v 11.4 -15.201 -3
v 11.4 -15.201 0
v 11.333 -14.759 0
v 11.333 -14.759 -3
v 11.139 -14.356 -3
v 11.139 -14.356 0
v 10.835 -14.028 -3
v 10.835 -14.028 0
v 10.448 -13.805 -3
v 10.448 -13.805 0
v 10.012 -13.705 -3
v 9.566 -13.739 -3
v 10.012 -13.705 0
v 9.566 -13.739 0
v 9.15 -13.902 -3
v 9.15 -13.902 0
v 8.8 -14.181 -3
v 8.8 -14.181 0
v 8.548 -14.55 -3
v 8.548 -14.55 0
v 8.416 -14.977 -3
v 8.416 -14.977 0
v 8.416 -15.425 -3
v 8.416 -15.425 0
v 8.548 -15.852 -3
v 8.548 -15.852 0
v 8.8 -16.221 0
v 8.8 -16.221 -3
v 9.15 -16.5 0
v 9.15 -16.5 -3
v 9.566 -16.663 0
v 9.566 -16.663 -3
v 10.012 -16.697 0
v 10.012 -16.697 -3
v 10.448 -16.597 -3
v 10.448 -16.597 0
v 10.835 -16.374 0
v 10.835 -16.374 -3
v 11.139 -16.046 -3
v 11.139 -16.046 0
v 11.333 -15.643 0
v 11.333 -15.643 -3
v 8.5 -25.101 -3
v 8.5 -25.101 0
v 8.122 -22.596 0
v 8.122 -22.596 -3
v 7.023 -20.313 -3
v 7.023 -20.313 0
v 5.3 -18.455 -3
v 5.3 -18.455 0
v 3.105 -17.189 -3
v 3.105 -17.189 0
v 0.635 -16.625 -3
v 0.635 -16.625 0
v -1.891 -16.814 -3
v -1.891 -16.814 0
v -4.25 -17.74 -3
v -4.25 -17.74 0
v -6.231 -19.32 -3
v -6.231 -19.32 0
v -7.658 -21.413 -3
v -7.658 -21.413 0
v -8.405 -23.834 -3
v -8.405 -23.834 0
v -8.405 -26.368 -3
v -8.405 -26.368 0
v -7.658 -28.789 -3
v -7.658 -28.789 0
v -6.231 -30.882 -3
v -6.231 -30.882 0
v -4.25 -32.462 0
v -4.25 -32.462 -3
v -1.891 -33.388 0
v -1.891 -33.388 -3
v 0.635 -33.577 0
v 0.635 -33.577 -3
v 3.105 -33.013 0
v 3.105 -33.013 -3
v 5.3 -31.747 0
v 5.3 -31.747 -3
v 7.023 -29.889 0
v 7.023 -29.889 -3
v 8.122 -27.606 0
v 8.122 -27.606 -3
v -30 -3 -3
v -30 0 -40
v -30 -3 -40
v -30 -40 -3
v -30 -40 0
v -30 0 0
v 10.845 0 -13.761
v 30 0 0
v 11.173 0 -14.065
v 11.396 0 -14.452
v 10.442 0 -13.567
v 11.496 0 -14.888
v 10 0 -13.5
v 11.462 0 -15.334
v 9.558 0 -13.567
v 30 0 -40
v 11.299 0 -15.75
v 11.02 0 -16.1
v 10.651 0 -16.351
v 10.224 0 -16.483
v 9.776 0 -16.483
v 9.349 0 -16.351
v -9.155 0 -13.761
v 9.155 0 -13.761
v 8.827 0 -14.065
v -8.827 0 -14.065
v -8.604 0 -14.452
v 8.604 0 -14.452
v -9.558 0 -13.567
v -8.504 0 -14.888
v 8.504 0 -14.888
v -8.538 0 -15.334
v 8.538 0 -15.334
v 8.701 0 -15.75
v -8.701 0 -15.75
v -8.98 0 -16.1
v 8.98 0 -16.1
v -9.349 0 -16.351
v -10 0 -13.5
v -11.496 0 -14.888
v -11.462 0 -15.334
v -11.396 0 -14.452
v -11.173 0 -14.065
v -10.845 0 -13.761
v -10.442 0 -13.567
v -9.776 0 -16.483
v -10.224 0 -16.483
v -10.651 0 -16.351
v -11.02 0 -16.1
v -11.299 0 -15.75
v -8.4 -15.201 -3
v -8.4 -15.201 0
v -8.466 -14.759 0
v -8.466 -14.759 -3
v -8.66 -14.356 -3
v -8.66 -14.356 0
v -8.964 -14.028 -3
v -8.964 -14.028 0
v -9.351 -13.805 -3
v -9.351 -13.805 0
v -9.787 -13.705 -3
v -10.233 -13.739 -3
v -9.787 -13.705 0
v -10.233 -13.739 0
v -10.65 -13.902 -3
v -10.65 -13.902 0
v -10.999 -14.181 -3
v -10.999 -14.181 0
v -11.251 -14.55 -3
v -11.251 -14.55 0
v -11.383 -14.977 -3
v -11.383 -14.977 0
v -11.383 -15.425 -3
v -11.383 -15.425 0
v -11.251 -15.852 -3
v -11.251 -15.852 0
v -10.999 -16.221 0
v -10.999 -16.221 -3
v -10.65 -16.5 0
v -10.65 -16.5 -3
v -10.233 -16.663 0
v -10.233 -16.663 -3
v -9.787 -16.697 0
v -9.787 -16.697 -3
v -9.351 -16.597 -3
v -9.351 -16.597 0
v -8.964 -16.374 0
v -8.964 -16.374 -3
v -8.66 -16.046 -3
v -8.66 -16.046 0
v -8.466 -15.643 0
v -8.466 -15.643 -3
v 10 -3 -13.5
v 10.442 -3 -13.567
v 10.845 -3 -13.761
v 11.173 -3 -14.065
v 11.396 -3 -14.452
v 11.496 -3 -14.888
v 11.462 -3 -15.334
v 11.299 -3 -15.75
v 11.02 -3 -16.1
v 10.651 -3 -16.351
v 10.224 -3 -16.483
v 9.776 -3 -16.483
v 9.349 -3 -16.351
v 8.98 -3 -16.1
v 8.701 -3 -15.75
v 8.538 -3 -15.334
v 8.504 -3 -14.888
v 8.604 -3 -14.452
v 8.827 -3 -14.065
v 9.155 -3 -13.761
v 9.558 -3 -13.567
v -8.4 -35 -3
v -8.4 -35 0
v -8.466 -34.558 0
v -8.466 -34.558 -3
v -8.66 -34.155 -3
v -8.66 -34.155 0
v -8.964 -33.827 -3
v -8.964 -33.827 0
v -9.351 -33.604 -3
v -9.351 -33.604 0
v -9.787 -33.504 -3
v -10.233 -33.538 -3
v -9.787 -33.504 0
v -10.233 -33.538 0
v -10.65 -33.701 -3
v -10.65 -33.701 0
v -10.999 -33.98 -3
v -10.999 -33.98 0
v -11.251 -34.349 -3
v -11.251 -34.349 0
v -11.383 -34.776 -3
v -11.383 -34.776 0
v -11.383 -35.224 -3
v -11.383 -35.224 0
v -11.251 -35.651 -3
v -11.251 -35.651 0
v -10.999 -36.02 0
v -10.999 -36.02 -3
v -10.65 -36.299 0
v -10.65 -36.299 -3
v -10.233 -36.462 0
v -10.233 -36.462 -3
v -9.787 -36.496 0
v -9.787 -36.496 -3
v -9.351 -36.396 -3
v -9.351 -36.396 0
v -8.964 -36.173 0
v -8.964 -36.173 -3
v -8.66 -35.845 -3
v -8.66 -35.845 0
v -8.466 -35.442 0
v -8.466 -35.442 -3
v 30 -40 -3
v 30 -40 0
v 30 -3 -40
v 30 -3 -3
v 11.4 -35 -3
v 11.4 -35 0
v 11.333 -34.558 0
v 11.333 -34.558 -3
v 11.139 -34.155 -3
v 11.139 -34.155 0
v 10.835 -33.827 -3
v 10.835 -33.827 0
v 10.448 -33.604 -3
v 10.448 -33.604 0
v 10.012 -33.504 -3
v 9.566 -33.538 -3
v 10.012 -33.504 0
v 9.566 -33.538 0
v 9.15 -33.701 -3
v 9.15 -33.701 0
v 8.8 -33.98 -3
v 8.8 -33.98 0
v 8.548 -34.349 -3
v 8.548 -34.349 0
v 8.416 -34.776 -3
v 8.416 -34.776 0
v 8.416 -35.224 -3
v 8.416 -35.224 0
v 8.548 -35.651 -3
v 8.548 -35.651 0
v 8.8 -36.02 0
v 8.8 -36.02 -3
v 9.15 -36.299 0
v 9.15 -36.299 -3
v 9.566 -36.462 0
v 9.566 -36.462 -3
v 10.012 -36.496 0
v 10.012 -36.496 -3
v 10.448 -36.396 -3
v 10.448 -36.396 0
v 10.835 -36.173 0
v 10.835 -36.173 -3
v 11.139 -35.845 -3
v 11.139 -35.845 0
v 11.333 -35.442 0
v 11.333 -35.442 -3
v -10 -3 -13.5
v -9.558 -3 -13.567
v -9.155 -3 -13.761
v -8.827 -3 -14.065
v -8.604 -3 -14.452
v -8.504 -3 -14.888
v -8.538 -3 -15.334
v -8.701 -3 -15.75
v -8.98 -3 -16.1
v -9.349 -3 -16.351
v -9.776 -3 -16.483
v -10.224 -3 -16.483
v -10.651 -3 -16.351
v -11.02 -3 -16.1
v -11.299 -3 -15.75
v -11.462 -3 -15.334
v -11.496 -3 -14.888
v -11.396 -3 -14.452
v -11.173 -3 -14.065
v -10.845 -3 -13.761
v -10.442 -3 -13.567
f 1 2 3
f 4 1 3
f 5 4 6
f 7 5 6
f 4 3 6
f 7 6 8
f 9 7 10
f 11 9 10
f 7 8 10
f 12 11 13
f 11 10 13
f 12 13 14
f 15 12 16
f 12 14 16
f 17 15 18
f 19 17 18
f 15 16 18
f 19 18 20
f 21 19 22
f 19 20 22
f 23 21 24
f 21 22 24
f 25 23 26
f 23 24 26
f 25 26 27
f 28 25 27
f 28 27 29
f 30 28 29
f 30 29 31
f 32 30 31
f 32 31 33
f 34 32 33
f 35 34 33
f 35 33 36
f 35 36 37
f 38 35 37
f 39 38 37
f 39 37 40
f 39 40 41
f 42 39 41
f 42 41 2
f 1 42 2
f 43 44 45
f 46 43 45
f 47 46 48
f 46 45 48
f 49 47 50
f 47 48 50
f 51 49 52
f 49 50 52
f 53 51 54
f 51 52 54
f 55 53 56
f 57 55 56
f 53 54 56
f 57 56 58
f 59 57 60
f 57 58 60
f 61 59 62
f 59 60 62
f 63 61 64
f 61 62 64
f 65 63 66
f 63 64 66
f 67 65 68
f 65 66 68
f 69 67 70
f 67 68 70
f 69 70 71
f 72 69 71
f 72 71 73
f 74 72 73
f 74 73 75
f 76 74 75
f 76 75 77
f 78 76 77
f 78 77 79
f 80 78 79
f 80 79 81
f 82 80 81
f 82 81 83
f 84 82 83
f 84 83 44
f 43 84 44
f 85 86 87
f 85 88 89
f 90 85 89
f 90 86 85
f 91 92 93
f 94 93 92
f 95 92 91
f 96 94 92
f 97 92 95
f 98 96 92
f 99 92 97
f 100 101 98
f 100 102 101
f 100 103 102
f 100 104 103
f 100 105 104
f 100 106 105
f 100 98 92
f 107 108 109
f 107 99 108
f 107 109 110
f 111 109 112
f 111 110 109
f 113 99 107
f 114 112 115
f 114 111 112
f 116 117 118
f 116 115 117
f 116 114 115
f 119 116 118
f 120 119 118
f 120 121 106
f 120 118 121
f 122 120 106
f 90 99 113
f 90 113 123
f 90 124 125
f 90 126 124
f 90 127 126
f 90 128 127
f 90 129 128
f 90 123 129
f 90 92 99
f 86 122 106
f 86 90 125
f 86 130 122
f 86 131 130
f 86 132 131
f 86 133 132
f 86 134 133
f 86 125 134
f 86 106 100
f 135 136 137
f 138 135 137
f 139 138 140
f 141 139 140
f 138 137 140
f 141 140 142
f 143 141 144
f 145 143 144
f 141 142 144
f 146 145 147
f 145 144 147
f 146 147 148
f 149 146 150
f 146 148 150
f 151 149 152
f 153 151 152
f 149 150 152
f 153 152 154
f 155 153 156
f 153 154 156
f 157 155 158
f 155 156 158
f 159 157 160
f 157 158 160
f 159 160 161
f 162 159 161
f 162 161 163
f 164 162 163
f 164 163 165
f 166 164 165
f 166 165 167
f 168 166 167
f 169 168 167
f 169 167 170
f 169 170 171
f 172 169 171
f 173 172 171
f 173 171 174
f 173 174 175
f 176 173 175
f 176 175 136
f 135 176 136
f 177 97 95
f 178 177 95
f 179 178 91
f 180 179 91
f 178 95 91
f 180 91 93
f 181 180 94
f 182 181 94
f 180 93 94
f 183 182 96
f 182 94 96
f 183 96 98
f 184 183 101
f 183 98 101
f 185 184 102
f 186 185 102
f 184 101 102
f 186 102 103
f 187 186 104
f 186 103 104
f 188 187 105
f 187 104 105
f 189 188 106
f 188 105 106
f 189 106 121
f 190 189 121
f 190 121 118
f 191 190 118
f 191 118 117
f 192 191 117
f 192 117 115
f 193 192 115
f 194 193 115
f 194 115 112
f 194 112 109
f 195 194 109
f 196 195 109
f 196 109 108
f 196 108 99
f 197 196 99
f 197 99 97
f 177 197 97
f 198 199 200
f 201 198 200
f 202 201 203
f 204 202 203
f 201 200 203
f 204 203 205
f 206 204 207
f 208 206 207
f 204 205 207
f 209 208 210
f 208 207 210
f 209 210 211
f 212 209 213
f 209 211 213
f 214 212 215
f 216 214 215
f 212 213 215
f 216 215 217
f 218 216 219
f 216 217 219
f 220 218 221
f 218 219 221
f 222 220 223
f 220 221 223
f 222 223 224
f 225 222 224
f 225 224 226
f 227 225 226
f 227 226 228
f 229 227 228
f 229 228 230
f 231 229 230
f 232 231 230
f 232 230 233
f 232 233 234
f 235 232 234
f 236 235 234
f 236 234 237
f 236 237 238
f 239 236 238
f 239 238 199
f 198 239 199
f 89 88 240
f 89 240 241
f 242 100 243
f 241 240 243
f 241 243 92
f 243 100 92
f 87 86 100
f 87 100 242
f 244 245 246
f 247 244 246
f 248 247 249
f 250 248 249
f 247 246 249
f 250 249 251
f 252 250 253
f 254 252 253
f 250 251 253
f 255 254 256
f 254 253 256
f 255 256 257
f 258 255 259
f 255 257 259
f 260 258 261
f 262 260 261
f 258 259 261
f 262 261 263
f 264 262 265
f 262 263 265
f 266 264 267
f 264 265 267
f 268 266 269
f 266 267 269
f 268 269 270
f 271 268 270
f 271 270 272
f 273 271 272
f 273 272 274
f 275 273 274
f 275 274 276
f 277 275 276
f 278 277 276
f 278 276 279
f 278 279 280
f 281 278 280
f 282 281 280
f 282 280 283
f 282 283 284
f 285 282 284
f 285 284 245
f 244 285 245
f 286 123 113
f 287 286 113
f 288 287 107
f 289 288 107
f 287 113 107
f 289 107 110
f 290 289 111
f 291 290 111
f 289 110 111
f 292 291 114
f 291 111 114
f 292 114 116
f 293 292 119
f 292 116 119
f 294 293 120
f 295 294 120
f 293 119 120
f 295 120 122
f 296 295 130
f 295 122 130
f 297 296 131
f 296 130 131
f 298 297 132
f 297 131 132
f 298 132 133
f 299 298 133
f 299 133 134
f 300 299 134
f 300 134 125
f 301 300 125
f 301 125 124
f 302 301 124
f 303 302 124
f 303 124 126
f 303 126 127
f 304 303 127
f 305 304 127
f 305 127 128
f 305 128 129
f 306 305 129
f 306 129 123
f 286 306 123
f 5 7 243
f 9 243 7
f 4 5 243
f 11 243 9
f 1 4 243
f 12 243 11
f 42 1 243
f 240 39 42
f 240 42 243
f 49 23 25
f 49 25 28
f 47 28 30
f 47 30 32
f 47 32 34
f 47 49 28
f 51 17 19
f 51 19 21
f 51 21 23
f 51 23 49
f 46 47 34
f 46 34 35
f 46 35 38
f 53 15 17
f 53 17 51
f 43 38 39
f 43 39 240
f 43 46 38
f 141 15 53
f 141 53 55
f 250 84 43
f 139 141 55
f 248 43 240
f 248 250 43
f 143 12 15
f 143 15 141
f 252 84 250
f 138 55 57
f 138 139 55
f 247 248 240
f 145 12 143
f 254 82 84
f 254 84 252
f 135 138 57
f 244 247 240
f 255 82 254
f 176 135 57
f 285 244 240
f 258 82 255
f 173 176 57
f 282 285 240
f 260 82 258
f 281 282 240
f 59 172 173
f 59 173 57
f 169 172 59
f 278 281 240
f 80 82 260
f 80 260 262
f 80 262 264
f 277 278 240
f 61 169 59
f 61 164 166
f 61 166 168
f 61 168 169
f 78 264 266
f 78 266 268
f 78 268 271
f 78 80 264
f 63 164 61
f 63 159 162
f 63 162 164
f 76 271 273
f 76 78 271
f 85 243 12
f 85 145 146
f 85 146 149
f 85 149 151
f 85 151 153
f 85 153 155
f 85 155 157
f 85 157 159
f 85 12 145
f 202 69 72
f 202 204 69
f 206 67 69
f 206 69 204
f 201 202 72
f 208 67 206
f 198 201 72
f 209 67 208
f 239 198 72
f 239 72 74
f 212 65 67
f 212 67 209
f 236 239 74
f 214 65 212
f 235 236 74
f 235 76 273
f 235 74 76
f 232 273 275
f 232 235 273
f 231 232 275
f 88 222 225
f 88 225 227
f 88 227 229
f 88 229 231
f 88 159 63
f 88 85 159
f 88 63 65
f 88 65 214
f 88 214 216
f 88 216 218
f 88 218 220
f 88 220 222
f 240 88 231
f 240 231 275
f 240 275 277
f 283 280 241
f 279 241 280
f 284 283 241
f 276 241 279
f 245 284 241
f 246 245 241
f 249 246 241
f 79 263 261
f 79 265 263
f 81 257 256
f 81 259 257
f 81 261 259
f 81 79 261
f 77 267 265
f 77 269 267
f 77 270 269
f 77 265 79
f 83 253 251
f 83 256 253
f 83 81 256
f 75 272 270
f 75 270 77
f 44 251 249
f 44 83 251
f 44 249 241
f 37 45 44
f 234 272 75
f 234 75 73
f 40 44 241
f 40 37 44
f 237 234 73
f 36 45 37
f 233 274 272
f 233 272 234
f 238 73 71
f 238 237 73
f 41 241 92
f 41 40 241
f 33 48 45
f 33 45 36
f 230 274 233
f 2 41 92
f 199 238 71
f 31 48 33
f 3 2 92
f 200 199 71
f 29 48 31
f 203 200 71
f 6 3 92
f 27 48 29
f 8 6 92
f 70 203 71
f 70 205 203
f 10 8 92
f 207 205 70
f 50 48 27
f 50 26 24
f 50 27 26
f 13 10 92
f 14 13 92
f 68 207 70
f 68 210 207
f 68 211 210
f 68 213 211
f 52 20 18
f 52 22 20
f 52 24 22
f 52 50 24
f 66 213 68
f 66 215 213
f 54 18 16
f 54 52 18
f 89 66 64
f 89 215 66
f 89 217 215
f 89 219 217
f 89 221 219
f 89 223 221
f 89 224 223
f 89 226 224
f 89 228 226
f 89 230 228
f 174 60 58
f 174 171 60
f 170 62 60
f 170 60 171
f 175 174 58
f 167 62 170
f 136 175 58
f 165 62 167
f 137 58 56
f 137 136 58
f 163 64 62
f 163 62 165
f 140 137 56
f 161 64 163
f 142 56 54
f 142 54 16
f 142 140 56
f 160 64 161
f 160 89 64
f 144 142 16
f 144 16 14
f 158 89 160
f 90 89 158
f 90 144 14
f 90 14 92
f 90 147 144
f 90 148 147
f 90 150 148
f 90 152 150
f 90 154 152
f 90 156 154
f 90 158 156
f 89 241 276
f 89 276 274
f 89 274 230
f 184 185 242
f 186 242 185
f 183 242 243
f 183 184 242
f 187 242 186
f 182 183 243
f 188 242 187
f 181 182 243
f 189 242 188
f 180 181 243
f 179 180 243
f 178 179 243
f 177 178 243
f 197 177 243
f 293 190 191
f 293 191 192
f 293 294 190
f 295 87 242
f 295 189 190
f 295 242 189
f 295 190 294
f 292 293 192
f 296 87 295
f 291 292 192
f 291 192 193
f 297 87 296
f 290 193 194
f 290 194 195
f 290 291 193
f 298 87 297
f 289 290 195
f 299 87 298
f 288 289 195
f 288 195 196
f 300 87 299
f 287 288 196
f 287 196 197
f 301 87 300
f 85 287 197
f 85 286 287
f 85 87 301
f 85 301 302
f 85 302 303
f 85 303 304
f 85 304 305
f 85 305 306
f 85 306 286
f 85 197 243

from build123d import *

# Parameters (mm, degrees)
BOSS_EXTRUDE1_DEPTH      = 30
BOSS_EXTRUDE1_DEPTH_BACK = 30
SKETCH2_R                = 1.5
SKETCH2_R_2              = 8.5
CUT_EXTRUDE1_DEPTH       = 30
SKETCH3_R                = 1.5
CUT_EXTRUDE2_DEPTH       = 30


with BuildPart() as part:
    # Sketch1 → Boss-Extrude1 (new, two sides: drawn at the far end of the back side and taken through both)
    with BuildSketch(Plane(origin=(0, 0, 0), x_dir=(0, 0, -1), z_dir=(1, 0, 0)).offset(-BOSS_EXTRUDE1_DEPTH_BACK)):
        Polygon((0, 0), (40, 0), (40, -3), (3, -3), (3, -40), (0, -40), align=None)
    extrude(amount=BOSS_EXTRUDE1_DEPTH + BOSS_EXTRUDE1_DEPTH_BACK)

    # Sketch2 → Cut-Extrude1 (cut)
    with BuildSketch(Plane.XY):
        with Locations((-9.8995, -15.201)):
            Circle(SKETCH2_R)
        with Locations((9.8995, -15.201)):
            Circle(SKETCH2_R)
        with Locations((-9.8995, -35)):
            Circle(SKETCH2_R)
        with Locations((9.8995, -35)):
            Circle(SKETCH2_R)
        with Locations((0, -25.101)):
            Circle(SKETCH2_R_2)
    extrude(amount=-CUT_EXTRUDE1_DEPTH, mode=Mode.SUBTRACT)

    # Sketch3 → Cut-Extrude2 (cut)
    with BuildSketch(Plane(origin=(0, 0, 0), x_dir=(1, 0, 0), z_dir=(0, 1, 0))):
        with Locations((-10, 15)):
            Circle(SKETCH3_R)
        with Locations((10, 15)):
            Circle(SKETCH3_R)
    extrude(amount=-CUT_EXTRUDE2_DEPTH, mode=Mode.SUBTRACT)


solid = part.part
